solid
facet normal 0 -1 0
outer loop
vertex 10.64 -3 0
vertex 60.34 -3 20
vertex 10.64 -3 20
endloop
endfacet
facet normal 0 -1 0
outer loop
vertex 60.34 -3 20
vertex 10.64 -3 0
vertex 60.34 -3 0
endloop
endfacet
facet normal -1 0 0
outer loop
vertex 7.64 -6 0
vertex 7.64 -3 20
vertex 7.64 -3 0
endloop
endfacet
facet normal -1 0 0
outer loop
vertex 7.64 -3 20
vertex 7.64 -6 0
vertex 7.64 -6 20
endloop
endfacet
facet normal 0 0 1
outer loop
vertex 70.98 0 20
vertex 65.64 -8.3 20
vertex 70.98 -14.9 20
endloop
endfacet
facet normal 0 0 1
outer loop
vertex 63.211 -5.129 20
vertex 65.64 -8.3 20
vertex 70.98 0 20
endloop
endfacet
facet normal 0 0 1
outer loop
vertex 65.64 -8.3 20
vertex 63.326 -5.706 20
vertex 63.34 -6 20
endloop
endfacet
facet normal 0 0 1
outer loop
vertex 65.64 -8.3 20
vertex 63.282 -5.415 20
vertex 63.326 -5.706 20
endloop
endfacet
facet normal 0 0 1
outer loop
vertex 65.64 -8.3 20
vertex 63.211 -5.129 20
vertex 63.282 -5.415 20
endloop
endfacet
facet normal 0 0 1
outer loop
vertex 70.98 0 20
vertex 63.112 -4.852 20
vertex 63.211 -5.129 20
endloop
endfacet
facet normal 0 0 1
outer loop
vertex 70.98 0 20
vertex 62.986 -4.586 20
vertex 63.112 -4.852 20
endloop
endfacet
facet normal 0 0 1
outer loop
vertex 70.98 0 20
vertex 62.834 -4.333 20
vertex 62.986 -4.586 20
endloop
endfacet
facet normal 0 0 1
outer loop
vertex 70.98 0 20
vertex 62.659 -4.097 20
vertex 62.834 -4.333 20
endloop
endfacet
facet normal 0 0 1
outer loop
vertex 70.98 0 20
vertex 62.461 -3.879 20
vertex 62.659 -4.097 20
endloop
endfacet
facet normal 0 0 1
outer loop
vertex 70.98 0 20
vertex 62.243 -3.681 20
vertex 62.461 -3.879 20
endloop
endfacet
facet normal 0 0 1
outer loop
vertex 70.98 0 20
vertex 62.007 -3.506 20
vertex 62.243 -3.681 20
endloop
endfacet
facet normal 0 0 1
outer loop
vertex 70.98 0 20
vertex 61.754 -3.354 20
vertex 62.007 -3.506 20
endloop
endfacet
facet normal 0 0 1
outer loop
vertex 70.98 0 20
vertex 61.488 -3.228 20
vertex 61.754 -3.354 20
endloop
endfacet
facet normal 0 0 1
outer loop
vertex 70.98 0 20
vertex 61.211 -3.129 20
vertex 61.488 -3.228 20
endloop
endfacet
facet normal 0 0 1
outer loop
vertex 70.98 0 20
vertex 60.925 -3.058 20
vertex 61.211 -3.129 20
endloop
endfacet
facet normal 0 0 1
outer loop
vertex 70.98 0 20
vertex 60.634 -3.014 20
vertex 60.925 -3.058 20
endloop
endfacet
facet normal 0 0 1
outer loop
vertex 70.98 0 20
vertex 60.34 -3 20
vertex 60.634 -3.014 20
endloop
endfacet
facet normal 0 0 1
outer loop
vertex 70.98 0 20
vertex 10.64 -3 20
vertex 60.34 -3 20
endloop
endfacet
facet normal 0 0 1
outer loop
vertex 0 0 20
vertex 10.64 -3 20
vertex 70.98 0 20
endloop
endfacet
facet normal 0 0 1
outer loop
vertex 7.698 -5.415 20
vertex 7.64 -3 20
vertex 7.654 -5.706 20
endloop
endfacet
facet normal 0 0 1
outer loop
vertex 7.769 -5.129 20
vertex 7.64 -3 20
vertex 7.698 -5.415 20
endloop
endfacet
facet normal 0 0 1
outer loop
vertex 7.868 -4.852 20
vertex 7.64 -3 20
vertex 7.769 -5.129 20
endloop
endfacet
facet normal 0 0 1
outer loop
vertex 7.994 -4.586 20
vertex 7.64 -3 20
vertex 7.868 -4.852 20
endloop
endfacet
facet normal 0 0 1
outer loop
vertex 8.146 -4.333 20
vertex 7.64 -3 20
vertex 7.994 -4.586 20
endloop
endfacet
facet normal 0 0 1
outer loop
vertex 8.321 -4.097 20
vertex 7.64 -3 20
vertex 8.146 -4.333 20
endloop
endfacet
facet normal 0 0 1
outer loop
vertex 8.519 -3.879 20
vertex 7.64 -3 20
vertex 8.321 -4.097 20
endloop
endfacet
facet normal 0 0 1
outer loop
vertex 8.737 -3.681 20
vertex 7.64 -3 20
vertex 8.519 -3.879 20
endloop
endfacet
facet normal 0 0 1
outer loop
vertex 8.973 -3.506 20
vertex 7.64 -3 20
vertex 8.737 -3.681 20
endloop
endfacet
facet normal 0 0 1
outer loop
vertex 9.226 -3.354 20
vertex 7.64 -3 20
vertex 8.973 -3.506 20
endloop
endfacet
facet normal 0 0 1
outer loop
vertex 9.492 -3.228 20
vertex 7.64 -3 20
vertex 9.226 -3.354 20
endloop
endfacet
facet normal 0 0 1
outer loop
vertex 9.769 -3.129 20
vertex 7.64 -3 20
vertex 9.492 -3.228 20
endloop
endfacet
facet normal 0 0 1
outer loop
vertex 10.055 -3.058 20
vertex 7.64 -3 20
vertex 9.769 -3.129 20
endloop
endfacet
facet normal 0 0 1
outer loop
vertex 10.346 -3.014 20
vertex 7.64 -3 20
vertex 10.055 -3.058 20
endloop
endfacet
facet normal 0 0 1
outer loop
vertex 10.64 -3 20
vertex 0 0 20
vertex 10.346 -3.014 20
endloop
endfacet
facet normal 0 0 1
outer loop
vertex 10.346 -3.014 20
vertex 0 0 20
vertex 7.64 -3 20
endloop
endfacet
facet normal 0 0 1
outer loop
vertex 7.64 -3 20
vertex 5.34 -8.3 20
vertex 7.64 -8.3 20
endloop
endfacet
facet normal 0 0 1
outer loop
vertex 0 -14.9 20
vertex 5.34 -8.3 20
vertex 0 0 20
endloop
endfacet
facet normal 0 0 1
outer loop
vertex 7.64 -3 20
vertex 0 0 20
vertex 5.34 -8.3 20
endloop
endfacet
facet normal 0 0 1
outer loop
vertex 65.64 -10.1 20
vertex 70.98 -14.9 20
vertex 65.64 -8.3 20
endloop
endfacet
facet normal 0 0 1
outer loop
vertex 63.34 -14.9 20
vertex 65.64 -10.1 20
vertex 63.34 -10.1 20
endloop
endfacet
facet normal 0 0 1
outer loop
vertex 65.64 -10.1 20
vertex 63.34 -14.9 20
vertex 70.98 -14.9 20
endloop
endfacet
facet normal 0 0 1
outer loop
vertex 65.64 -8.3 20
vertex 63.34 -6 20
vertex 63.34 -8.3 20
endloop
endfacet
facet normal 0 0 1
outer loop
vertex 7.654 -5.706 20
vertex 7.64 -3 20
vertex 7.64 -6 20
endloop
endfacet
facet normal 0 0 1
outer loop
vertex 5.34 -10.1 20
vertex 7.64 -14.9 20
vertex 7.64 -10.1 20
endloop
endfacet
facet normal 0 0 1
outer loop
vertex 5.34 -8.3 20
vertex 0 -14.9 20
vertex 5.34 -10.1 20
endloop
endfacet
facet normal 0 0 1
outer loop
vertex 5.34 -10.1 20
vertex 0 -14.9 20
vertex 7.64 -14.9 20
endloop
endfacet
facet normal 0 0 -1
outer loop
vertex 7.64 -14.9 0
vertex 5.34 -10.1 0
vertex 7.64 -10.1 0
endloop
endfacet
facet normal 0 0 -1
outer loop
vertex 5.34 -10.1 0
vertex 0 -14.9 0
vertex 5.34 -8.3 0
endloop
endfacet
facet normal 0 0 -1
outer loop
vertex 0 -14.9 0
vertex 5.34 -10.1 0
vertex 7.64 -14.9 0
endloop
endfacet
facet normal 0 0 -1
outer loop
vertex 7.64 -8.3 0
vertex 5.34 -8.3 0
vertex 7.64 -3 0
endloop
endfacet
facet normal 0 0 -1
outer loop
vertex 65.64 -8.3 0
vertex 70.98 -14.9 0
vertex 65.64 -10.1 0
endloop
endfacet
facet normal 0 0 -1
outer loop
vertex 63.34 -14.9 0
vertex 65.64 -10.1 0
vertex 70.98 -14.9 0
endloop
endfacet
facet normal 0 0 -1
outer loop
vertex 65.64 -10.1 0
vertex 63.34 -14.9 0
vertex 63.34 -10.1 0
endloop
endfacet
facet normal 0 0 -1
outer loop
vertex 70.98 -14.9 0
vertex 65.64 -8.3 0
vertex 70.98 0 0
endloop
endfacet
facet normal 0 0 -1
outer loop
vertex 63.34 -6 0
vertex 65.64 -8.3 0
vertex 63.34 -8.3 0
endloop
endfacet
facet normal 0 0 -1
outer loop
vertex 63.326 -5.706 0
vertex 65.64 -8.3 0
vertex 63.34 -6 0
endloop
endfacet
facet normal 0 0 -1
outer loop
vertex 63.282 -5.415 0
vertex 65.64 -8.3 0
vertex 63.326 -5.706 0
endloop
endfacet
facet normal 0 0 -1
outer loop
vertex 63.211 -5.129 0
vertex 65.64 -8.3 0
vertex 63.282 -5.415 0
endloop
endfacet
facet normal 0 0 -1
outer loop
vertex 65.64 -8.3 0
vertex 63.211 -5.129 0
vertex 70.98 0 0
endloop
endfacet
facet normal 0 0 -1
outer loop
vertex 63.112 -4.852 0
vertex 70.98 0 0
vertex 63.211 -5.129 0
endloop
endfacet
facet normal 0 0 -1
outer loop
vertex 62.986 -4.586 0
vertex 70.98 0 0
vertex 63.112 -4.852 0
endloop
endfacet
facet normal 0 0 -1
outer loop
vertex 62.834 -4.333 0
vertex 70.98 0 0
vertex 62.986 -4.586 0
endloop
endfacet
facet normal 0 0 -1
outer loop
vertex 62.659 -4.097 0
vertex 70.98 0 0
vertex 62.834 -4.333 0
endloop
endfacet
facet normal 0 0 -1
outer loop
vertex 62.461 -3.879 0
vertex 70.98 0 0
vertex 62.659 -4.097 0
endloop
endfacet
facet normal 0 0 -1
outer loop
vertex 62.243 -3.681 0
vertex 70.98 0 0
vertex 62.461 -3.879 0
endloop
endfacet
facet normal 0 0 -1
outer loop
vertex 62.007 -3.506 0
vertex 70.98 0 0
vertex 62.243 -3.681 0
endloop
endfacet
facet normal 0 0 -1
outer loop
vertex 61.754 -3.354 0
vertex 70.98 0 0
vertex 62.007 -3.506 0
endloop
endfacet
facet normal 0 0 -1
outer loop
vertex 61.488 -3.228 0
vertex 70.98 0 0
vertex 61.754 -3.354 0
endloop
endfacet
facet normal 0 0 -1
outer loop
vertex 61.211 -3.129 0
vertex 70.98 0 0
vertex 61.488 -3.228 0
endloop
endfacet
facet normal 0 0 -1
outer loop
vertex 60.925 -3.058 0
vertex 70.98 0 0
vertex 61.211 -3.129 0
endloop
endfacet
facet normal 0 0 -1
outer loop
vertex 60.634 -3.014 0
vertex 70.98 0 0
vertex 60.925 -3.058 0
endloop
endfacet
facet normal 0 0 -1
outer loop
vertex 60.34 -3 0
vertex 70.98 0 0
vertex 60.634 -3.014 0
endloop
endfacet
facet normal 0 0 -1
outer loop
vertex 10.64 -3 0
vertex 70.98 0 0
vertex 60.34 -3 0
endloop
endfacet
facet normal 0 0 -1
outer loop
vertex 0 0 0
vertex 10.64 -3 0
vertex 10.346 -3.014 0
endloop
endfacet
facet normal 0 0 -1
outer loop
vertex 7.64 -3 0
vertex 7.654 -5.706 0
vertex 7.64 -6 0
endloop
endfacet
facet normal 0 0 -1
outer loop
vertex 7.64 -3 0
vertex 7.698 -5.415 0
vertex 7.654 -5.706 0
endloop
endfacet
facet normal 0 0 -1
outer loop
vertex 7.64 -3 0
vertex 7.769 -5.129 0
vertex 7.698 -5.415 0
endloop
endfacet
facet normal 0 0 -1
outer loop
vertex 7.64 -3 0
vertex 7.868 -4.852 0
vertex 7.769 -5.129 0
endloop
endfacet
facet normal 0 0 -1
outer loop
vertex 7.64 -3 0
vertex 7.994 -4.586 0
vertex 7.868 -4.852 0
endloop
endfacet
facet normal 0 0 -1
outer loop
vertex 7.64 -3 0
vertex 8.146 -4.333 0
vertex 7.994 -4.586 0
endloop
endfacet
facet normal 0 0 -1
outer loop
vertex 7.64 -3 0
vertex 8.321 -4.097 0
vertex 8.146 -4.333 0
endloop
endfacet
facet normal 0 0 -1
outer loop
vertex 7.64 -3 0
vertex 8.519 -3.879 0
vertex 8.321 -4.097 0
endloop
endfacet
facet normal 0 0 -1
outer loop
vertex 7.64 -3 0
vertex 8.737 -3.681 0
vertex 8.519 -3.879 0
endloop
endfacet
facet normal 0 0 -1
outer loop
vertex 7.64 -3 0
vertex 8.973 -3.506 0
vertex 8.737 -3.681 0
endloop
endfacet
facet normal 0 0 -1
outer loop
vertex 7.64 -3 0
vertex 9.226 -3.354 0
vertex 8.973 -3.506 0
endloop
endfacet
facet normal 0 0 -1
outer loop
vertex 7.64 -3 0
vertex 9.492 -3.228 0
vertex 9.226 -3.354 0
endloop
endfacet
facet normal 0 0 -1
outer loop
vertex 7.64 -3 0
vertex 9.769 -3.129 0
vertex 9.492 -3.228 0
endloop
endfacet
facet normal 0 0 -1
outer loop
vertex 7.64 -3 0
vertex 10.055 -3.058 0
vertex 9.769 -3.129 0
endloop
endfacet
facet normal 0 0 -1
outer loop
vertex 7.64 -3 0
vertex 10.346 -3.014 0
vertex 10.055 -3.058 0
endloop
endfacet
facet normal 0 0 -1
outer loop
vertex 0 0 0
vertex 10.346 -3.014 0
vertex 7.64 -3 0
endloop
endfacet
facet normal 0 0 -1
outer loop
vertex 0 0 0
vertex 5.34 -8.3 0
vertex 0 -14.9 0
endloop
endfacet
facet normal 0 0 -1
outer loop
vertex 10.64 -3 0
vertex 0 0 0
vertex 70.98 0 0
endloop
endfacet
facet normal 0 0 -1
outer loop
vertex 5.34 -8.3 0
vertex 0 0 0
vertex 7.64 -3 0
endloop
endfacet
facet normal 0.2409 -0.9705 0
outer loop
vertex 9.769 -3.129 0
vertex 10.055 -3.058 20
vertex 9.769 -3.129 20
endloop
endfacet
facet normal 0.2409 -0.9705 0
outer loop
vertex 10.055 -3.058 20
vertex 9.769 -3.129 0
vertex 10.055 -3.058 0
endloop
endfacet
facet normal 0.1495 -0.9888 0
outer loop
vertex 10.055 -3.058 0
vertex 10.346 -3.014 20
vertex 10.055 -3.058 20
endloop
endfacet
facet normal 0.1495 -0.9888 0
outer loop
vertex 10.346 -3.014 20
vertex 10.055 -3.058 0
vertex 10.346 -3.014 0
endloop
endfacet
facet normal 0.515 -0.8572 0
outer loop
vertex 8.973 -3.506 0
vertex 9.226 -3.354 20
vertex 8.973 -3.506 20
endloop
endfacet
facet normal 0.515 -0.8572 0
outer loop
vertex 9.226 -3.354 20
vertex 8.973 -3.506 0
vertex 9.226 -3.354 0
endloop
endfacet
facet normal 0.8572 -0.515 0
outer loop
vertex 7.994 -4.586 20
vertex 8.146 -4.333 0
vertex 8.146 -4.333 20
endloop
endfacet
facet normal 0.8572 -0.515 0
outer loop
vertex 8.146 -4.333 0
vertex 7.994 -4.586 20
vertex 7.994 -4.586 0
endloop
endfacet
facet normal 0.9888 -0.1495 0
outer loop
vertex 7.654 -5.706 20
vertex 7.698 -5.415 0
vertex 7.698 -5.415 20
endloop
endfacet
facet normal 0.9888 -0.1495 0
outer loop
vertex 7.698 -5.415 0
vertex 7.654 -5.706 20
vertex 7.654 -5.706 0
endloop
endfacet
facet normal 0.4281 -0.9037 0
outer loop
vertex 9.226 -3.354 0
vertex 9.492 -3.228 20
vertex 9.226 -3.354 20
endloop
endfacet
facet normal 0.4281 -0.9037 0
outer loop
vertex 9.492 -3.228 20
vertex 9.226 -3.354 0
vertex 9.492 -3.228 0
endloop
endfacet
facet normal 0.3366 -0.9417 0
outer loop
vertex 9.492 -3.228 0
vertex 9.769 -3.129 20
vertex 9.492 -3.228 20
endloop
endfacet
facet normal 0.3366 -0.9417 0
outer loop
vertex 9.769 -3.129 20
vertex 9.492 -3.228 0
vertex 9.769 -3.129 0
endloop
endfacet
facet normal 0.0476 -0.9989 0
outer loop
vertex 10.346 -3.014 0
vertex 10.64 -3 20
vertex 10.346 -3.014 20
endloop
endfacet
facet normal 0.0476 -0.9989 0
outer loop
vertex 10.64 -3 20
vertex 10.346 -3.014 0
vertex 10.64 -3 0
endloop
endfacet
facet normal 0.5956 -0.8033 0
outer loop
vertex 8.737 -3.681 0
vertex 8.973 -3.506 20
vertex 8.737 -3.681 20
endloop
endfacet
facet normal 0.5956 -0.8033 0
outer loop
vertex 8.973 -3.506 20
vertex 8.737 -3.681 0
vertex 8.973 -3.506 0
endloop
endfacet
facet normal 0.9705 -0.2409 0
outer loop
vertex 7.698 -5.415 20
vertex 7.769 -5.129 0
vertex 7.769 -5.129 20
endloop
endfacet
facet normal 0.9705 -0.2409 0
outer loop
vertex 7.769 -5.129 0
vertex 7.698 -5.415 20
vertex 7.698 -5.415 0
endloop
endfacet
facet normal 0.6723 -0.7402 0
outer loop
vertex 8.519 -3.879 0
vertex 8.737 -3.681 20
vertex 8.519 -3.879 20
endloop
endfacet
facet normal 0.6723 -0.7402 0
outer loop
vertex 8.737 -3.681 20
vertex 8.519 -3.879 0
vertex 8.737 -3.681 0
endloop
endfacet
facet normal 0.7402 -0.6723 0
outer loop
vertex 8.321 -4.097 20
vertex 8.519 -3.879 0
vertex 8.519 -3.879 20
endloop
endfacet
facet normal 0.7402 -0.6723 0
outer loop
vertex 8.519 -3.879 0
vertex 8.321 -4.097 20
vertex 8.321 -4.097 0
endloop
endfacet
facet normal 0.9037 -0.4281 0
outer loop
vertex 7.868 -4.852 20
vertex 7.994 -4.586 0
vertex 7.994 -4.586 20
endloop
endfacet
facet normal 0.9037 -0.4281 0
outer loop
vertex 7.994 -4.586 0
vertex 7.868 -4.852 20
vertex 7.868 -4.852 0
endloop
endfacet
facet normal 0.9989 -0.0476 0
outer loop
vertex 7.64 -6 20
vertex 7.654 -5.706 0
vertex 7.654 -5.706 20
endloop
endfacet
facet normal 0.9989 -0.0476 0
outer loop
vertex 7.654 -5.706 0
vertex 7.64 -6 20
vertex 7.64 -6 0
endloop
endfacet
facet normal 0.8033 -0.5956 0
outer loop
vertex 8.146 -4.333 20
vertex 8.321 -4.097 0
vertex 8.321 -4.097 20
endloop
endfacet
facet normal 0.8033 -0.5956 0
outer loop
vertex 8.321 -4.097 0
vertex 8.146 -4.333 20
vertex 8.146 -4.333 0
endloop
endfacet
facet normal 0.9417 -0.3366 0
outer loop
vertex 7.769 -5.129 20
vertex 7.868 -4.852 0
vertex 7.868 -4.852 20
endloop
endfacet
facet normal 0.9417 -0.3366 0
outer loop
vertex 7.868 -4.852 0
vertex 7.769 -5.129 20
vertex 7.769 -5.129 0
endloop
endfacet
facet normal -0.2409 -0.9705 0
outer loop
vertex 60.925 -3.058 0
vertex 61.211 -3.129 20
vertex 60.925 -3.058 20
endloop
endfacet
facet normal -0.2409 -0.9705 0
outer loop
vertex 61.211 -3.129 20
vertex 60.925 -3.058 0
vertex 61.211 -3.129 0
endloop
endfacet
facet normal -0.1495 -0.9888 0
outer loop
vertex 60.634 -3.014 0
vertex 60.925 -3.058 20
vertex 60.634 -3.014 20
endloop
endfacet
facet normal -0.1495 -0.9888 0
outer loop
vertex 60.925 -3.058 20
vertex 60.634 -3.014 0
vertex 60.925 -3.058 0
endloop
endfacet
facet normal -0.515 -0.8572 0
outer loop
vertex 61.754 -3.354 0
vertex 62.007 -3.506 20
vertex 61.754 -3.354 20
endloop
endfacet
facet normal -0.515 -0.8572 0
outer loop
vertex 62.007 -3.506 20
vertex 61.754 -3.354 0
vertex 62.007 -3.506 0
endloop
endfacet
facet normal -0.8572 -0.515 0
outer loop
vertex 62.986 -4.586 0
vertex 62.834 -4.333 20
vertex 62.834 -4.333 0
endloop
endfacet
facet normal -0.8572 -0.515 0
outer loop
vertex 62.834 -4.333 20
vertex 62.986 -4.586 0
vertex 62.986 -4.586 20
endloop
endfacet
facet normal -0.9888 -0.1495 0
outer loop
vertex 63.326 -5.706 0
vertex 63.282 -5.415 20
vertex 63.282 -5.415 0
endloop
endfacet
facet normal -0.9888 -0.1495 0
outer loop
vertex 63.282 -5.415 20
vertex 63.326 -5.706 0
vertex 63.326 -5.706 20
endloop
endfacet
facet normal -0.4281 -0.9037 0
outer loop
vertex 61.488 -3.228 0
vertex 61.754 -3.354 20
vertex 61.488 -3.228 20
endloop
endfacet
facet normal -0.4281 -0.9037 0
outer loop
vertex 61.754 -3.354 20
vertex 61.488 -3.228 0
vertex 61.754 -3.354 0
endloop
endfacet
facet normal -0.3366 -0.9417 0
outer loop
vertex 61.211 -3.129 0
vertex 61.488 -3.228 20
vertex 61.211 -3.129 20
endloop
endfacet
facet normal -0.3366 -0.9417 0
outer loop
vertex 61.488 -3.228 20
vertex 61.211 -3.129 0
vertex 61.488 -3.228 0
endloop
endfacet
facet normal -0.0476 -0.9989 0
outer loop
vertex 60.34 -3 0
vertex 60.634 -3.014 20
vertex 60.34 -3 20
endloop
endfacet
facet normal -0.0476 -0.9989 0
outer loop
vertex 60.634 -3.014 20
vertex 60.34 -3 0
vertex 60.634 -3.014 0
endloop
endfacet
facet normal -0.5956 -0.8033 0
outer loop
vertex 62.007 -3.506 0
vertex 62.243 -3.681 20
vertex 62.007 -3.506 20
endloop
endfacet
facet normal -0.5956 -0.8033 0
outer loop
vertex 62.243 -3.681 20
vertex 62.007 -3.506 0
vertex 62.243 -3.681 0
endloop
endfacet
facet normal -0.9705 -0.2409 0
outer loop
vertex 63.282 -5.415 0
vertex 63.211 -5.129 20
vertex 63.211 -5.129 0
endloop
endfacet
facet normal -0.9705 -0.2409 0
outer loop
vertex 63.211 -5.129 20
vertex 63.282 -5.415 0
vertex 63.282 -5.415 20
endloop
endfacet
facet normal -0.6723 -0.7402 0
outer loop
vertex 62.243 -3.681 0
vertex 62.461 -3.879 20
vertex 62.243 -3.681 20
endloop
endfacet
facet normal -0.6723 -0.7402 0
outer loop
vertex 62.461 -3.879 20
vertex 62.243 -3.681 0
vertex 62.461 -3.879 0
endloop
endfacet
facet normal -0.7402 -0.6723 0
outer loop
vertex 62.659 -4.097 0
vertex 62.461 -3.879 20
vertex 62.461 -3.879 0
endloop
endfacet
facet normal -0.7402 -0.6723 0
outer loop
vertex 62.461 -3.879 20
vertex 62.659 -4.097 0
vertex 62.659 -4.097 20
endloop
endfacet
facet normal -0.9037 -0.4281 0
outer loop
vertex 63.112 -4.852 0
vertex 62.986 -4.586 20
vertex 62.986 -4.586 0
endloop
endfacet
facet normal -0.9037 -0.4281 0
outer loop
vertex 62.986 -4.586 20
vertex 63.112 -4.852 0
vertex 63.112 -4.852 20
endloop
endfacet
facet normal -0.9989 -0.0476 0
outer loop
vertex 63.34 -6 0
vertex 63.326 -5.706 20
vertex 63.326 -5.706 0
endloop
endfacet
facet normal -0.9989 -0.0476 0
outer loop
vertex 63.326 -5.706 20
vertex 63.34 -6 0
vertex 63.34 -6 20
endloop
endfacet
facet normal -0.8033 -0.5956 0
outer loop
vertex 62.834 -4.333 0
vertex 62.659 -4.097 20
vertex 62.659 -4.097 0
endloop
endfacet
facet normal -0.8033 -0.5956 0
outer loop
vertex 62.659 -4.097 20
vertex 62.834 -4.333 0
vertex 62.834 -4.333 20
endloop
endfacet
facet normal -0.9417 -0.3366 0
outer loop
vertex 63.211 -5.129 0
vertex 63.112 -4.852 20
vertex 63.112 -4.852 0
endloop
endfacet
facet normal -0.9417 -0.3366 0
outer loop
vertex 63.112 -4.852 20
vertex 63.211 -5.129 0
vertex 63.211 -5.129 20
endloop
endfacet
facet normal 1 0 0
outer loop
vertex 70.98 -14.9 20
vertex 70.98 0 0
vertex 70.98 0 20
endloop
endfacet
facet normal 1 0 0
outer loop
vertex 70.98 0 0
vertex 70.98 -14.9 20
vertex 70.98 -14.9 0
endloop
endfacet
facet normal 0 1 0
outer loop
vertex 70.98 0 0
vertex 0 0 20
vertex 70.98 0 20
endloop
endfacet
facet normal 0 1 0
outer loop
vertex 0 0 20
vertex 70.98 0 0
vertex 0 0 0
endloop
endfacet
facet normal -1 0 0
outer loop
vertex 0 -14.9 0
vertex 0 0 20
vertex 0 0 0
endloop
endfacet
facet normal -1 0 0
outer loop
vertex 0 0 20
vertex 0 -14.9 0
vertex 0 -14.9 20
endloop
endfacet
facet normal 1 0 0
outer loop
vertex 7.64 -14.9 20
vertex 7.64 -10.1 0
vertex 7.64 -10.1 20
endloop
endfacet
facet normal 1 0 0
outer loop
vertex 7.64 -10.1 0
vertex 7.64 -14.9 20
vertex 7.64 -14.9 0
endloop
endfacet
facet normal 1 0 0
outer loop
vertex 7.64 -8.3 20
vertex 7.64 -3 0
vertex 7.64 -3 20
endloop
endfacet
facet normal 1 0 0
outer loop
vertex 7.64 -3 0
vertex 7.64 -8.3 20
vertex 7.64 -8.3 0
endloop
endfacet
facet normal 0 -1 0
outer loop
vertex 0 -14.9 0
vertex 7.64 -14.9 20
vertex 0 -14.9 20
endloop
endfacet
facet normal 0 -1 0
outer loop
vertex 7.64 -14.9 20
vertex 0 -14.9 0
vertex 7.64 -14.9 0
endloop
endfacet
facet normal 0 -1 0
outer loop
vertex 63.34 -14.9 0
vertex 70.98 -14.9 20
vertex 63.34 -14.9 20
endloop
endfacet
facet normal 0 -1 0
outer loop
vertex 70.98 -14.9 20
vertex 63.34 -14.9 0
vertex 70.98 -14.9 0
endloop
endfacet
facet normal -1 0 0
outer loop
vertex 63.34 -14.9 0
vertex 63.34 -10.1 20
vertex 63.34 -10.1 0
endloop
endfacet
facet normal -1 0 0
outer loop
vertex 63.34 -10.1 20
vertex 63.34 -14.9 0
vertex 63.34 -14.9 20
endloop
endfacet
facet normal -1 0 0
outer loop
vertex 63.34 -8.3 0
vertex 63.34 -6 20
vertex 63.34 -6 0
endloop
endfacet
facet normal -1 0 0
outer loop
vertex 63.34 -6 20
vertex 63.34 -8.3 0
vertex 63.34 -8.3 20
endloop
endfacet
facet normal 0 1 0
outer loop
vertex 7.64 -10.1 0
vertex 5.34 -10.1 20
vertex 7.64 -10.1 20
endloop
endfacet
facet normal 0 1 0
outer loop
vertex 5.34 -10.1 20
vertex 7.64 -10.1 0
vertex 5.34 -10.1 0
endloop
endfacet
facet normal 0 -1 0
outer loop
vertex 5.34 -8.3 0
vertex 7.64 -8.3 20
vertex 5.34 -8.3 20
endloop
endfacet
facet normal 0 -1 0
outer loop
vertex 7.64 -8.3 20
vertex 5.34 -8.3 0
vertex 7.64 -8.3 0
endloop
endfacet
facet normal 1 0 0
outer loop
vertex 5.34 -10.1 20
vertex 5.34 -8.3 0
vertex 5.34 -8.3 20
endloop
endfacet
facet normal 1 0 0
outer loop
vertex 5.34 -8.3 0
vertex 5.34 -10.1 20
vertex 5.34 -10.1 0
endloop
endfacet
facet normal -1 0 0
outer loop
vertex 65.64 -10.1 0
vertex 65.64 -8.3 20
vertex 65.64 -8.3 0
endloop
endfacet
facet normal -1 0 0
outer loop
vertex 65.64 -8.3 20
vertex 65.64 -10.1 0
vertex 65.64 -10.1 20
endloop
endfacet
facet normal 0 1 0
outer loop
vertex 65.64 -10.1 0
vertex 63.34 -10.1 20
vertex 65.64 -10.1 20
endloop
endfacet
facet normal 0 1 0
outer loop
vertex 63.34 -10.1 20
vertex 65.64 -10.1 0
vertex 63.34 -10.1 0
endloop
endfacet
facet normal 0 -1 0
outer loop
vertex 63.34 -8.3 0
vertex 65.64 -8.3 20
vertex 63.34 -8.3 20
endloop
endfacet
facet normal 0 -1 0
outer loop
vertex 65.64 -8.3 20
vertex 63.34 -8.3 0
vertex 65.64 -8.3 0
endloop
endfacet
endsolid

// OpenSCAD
// file: bracket_lib.scad
// Shared U-bracket holding a PCB in a slot in each upright. All sizes in mm.
// Part files load this with: use <bracket_lib.scad>
//
// Print settings (Ultimaker Cura, PLA, 0.4 mm nozzle), tuned for strength, not looks.
// Cura profile: BracketStrong.curaprofile
//   Orientation       On its side: U-profile flat on the plate, depth upward.
//                     bracket_printable() already rotates it this way.
//                     Layers then run across the uprights, not up them. No supports needed.
//   Layer Height      0.2 mm (thicker layers bond better than fine ones)
//   Wall Line Count   5 (walls carry most of the load; 2 mm shell each side)
//   Top/Bottom        1.2 mm
//   Infill            40 %, Gyroid (strong in all directions)
//   Printing Temp     +5..10 °C over your normal PLA profile, for better layer bonding
//   Fan Speed         reduce to ~50 %, same reason
//   Adhesion          Brim, 5 mm (the 3 mm floor strip is the thin edge that can lift)

// Concave fillet along Y, filling the corner at the origin towards +X and +Z.
module fillet(r, depth) {
    difference() {
        cube([r, depth, r]);
        translate([r, -1, r]) rotate([-90, 0, 0]) cylinder(r = r, h = depth + 2, $fn = 64);
    }
}

// slot_span:  distance between slot bottoms = PCB width + clearance (critical)
// depth:      along Y; height: top of uprights; base: floor thickness
// wall:       upright thickness
// slot_z:     bottom of slot from floor underside; slot_h: slot height
// slot_depth: how far the slot cuts into the upright, from the inside
// fillet_r:   inside corner floor/upright, 0 for none; keep below slot_z - base
module bracket(slot_span, depth, height, base, wall, slot_z, slot_h, slot_depth, fillet_r) {
    length = slot_span - 2 * slot_depth + 2 * wall;
    echo(length = length);
    difference() {
        union() {
            cube([length, depth, base]);                       // floor
            cube([wall, depth, height]);                       // left upright
            translate([length - wall, 0, 0]) cube([wall, depth, height]);  // right upright
            if (fillet_r > 0) {
                translate([wall, 0, base]) fillet(fillet_r, depth);
                translate([length - wall, 0, base]) mirror([1, 0, 0]) fillet(fillet_r, depth);
            }
        }
        // slots, cut from the inside face; 0.01 overlap avoids zero-thickness skins
        for (x = [wall - slot_depth, length - wall - 0.01])
            translate([x, -1, slot_z]) cube([slot_depth + 0.01, depth + 2, slot_h]);
    }
}

// Same bracket, rotated into print orientation (on its side).
module bracket_printable(slot_span, depth, height, base, wall, slot_z, slot_h, slot_depth, fillet_r) {
    rotate([90, 0, 0])
        bracket(slot_span, depth, height, base, wall, slot_z, slot_h, slot_depth, fillet_r);
}
// main file
// SVB power supply bracket. Print settings: see bracket_lib.scad.
use <bracket_lib.scad>

slot_span  = 60.3;  // distance between slot bottoms = PCB width + clearance (critical)
depth      = 20;
height     = 14.9;
base       = 3;
wall       = 7.64;
slot_z     = 8.3;
slot_h     = 1.8;   // PCB 1.6 + clearance for PLA shrink
slot_depth = 2.3;
fillet_r   = 3;

bracket_printable(slot_span, depth, height, base, wall, slot_z, slot_h, slot_depth, fillet_r);
